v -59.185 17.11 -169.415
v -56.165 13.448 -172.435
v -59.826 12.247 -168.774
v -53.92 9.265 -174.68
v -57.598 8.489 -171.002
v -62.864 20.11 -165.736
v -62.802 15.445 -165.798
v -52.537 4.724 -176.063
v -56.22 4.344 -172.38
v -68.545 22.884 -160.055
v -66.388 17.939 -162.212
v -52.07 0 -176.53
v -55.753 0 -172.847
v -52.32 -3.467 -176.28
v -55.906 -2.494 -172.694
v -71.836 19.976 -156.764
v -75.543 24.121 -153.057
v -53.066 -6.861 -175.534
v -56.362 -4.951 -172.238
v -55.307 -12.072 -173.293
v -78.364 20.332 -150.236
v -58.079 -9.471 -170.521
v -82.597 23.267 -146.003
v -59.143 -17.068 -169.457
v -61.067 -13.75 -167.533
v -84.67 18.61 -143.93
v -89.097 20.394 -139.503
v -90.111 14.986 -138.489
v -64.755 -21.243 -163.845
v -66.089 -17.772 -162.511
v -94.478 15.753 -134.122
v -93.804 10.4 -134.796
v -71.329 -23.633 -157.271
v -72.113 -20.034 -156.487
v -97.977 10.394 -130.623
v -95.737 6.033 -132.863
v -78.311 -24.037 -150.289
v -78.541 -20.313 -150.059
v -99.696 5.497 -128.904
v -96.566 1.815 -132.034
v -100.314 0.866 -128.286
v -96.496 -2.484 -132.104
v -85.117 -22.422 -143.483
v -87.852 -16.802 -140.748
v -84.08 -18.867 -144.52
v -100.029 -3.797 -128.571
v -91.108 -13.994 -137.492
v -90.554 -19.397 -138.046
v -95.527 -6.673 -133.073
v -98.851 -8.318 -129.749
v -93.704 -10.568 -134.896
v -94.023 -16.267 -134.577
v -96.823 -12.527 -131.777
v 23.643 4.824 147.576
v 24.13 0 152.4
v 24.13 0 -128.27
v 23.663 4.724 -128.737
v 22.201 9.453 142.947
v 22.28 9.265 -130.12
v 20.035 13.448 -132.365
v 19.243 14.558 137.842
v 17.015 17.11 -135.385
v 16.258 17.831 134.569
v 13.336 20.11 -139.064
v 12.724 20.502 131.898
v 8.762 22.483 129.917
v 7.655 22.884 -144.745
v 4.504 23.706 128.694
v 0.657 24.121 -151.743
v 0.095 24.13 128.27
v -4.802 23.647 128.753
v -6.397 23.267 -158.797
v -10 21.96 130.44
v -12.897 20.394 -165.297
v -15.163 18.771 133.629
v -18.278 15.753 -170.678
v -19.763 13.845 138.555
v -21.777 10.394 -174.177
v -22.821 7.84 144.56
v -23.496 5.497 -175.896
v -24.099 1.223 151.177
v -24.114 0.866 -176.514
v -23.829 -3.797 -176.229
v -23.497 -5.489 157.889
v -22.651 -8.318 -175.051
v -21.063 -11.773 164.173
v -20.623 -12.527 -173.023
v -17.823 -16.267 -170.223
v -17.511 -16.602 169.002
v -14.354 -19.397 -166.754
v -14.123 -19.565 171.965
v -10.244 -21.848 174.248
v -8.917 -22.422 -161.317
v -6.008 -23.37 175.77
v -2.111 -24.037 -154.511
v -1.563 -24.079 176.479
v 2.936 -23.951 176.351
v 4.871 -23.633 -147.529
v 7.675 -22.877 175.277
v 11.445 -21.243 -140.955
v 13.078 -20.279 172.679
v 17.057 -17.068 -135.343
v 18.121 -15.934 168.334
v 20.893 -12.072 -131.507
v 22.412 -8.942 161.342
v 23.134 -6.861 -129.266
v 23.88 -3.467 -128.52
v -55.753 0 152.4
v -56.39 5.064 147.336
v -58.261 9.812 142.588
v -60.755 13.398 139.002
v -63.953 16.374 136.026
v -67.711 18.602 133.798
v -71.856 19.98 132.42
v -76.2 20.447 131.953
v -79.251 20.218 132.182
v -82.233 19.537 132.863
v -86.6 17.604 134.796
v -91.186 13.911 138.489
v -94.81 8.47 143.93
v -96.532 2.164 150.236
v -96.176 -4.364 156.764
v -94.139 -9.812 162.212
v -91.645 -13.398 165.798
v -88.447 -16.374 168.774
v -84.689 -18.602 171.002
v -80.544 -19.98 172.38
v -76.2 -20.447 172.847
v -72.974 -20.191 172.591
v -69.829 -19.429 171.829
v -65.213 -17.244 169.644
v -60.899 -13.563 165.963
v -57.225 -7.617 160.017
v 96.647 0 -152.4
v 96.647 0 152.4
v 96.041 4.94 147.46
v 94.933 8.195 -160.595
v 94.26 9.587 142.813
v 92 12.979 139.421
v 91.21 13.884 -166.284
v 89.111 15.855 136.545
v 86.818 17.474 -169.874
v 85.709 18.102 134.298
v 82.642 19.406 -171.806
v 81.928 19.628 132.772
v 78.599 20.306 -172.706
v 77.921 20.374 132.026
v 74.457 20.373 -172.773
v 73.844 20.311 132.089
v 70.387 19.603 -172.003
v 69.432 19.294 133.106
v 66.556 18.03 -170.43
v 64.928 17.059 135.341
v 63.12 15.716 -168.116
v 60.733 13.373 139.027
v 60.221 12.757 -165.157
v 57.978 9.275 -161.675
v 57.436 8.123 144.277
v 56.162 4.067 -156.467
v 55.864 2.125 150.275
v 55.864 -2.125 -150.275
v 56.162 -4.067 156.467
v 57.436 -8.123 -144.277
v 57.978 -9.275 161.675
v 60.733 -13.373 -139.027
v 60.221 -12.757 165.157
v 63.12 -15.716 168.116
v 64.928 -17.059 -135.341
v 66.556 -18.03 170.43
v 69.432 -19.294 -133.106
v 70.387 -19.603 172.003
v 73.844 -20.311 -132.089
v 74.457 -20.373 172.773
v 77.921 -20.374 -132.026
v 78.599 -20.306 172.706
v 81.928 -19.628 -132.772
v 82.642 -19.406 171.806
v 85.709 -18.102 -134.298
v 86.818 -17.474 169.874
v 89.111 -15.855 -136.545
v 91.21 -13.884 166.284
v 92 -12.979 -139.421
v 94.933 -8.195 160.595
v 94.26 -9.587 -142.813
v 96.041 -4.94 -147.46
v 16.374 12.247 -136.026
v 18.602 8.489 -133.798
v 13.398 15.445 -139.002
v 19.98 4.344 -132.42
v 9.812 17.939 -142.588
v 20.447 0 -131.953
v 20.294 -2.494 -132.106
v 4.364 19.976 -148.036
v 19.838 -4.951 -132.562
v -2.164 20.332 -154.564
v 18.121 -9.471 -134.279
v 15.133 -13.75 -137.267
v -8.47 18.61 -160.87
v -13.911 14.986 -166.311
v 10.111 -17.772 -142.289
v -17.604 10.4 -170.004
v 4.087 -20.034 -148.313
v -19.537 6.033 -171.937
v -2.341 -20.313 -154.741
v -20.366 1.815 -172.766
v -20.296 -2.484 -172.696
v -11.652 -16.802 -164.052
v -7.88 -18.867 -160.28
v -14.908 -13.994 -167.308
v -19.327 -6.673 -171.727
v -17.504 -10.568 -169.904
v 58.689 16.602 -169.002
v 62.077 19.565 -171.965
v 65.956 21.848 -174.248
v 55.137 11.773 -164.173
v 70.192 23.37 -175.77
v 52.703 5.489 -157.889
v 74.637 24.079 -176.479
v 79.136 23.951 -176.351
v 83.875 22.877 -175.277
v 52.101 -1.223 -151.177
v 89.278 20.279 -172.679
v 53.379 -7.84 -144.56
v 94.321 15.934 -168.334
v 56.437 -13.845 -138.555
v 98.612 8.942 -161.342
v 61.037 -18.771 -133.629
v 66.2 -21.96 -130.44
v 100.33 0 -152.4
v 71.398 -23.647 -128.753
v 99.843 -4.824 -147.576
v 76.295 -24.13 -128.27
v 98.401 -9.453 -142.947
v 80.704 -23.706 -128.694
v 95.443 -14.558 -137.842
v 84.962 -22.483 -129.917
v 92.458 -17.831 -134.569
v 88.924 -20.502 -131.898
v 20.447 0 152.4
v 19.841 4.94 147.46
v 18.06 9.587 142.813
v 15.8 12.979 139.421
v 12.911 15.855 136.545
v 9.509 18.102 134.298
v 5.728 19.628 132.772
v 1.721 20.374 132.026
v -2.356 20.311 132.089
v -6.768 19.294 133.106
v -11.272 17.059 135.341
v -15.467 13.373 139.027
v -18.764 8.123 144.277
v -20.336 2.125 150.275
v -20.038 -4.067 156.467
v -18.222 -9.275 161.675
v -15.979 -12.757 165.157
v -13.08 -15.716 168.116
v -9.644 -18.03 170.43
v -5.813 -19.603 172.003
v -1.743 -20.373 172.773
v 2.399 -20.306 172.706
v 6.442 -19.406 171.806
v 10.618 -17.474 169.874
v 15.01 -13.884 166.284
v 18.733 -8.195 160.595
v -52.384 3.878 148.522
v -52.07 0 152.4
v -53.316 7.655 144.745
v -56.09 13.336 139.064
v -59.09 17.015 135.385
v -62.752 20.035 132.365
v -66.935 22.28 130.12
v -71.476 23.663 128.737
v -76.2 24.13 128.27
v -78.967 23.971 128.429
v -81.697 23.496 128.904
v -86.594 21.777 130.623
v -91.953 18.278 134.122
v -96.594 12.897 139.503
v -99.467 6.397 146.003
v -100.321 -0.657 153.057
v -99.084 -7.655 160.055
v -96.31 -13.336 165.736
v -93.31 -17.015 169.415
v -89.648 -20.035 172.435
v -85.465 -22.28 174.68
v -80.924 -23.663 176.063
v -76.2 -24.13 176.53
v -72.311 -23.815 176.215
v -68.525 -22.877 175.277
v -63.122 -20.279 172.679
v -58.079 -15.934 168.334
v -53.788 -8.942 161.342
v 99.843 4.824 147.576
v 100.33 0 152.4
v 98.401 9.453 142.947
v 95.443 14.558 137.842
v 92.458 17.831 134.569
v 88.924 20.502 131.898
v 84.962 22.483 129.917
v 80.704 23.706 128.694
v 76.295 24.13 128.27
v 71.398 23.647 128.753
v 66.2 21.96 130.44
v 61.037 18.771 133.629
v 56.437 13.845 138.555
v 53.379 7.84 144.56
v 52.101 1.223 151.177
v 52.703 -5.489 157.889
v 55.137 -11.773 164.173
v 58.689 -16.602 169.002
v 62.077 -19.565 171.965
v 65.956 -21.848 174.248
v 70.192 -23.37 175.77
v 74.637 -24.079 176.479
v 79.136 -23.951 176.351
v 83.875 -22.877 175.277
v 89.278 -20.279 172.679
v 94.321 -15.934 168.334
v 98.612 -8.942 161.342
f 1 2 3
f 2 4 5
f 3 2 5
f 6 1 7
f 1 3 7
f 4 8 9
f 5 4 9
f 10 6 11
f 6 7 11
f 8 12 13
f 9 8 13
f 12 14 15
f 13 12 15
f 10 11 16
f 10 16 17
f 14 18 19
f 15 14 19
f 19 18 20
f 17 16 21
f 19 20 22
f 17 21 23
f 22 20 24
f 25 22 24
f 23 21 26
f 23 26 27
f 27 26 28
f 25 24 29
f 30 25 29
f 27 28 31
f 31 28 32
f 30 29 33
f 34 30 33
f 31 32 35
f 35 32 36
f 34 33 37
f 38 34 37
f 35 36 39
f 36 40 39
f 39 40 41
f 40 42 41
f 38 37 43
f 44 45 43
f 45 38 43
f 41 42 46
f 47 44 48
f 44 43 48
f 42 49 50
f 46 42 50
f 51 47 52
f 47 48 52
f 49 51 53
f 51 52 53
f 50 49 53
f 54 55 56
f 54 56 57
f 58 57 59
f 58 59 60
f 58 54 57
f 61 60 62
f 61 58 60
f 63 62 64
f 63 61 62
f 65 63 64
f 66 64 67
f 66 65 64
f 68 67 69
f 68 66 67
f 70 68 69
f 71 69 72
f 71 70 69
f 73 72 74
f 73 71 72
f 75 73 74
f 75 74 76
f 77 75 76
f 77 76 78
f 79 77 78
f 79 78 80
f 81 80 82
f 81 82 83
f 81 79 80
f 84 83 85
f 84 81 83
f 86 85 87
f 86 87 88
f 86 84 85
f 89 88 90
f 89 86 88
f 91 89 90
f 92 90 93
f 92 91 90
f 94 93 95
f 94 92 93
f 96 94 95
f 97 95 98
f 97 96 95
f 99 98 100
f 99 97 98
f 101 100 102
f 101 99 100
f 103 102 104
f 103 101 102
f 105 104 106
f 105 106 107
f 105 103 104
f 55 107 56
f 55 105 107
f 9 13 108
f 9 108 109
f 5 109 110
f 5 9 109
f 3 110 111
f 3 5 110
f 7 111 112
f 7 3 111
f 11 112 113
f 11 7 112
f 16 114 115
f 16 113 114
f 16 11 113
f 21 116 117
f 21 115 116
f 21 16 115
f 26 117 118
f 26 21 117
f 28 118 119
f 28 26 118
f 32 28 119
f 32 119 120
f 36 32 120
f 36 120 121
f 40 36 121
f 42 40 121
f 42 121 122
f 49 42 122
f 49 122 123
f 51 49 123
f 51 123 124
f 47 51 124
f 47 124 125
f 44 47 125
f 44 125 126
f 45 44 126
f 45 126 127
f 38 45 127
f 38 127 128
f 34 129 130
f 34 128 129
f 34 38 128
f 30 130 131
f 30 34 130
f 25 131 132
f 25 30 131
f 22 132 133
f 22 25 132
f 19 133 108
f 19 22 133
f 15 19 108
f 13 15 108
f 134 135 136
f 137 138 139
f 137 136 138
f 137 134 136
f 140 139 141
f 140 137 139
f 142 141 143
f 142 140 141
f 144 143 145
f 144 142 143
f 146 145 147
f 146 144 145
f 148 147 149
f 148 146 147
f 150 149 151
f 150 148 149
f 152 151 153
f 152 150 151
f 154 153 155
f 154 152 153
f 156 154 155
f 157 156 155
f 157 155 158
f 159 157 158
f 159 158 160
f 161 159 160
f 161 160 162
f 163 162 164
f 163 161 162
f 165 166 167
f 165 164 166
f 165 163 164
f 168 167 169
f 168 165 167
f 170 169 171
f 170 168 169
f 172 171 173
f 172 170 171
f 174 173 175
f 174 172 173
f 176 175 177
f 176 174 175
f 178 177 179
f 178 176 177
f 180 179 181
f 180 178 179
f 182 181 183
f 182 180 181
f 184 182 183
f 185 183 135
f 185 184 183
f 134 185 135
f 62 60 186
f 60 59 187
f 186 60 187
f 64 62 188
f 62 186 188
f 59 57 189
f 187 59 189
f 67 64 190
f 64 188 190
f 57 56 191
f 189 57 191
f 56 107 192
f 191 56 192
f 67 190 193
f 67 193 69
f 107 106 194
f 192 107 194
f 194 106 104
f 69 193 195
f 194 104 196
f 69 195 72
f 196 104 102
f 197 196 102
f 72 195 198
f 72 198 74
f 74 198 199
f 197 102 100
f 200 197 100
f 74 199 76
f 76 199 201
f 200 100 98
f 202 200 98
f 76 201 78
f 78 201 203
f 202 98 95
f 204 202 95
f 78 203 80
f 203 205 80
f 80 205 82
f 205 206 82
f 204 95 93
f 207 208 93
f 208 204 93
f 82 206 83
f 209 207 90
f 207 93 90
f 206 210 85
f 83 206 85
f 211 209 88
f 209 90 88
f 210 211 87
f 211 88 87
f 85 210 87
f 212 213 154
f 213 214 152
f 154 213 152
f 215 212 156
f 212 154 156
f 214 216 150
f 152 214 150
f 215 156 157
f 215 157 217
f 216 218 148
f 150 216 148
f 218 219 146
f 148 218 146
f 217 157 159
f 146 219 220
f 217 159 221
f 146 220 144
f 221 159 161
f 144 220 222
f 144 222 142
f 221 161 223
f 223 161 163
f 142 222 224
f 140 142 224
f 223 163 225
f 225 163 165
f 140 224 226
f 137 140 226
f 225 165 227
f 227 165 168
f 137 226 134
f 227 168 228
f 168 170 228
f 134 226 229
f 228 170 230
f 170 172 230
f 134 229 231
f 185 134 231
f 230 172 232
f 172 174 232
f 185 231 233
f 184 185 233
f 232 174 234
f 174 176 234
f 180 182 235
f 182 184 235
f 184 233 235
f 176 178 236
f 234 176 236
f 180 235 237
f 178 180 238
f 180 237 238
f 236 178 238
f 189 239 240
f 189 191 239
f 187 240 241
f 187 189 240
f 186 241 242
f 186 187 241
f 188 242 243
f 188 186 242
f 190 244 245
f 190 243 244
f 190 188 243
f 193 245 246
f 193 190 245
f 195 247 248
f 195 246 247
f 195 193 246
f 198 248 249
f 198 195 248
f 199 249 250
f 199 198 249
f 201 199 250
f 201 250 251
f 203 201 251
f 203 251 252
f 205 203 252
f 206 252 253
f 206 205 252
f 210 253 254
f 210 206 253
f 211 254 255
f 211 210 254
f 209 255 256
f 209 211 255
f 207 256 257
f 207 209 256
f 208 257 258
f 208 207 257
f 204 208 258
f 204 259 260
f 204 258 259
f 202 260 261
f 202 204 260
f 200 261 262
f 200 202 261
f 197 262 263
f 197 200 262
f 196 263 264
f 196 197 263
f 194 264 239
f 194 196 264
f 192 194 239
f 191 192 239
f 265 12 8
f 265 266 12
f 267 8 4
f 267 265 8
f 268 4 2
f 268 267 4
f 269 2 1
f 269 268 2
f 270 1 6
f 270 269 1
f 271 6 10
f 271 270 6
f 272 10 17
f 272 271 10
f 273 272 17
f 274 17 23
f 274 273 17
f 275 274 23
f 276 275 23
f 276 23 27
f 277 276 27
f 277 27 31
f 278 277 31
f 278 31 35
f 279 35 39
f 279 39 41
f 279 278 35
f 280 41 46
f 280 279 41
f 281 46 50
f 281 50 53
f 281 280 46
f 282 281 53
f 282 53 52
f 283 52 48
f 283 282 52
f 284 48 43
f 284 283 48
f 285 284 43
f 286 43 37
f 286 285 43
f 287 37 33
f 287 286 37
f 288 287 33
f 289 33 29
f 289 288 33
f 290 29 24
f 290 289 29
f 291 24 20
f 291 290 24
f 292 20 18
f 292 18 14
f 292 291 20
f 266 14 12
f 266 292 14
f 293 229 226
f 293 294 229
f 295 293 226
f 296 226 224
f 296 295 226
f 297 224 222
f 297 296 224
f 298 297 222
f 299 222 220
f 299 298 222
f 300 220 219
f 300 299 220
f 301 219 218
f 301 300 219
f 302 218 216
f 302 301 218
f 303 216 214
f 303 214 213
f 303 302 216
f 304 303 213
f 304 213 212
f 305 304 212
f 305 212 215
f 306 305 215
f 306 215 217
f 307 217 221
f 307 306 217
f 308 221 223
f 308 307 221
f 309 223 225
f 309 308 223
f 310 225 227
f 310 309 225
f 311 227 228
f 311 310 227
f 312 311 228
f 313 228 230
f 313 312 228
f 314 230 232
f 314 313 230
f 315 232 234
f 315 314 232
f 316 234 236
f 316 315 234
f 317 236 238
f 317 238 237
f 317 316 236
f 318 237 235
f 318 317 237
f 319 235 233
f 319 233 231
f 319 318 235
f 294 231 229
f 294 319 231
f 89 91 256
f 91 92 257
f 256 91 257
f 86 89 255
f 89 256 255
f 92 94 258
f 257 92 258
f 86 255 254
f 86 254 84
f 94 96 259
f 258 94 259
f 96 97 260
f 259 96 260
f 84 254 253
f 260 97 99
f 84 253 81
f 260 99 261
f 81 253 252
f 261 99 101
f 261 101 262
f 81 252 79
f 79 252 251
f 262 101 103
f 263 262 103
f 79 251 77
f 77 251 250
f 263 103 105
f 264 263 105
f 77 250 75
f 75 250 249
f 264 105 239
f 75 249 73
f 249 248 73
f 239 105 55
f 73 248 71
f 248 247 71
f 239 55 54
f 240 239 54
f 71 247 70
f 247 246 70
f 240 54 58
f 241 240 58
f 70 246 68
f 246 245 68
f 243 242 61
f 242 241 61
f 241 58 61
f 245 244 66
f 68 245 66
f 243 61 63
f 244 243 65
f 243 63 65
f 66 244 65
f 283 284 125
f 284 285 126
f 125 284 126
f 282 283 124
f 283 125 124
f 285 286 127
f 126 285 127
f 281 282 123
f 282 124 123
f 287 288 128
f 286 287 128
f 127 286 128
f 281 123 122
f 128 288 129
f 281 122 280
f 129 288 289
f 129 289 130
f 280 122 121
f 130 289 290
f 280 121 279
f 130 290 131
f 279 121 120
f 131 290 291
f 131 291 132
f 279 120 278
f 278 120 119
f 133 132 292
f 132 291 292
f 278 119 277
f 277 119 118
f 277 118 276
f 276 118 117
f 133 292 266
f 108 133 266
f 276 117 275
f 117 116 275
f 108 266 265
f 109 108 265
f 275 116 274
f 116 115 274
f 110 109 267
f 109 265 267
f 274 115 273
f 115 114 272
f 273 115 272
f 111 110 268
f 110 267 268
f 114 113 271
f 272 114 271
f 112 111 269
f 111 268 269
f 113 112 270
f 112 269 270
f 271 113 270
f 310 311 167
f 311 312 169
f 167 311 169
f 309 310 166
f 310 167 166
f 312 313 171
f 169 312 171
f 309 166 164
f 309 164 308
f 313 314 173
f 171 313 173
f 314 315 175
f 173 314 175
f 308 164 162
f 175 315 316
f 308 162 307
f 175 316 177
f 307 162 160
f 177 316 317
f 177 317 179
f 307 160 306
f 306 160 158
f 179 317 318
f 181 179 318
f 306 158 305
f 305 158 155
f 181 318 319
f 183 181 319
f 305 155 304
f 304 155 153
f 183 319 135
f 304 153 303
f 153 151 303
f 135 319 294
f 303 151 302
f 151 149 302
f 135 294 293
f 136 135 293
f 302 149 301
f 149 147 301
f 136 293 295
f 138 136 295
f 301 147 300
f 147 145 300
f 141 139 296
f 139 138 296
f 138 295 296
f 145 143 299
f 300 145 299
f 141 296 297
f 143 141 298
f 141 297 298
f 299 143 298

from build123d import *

# Parameters (mm, degrees)
F0_R      = 24.13
F0_R_2    = 20.447
F1_DEPTH  = 381
F2_R      = 24.13
F2_R_2    = 20.447
F3_DEPTH  = 228.6
F5_DEPTH  = 76.2
F7_DEPTH  = 76.2
F8_R      = 24.13
F8_R_2    = 20.447
F9_DEPTH  = 254
F11_DEPTH = 152.4
F13_DEPTH = 76.2
F16_DEPTH = 76.2


with BuildPart() as f1:
    # F0 (on Top) → F1 (new body, symmetric)
    with BuildSketch(Plane.XY):
        Circle(F0_R)
        Circle(F0_R_2, mode=Mode.SUBTRACT)
    extrude(amount=F1_DEPTH, both=True)


with BuildPart() as f3:
    # F2 (on Top) → F3 (new body, symmetric)
    with BuildSketch(Plane.XY):
        with Locations((-76.2, 0)):
            Circle(F2_R)
        with Locations((-76.2, 0)):
            Circle(F2_R_2, mode=Mode.SUBTRACT)
    extrude(amount=F3_DEPTH, both=True)


with BuildPart() as f5_tool:
    # F4 (on Front) → F5 (new body, symmetric)
    with BuildSketch(Plane.XZ):
        Polygon((76.2, -76.2), (0, -152.4), (-76.2, -228.6), (-403.8831914788, -406.4), (440.9483480078, -406.4), align=None)
    extrude(amount=F5_DEPTH, both=True)


with BuildPart() as f1_1:
    add(f1.part)

    # F5: cut by f5_tool
    add(f5_tool.part, mode=Mode.SUBTRACT)


with BuildPart() as f3_1:
    add(f3.part)

    # F5: cut by f5_tool
    add(f5_tool.part, mode=Mode.SUBTRACT)


with BuildPart() as f7_tool:
    # F6 (on Right) → F7 (new body, symmetric)
    with BuildSketch(Plane.YZ):
        Polygon((-76.2, 228.6), (0, 152.4), (76.2, 76.2), (76.2, 457.2), (-76.2, 457.2), align=None)
    extrude(amount=F7_DEPTH, both=True)


with BuildPart() as f1_2:
    add(f1_1.part)

    # F7: cut by f7_tool
    add(f7_tool.part, mode=Mode.SUBTRACT)


with BuildPart() as f3_2:
    add(f3_1.part)

    # F7: cut by f7_tool
    add(f7_tool.part, mode=Mode.SUBTRACT)


with BuildPart() as f9:
    # F8 (on Top) → F9 (new body, symmetric)
    with BuildSketch(Plane.XY):
        with Locations((76.2, 0)):
            Circle(F8_R)
        with Locations((76.2, 0)):
            Circle(F8_R_2, mode=Mode.SUBTRACT)
    extrude(amount=F9_DEPTH, both=True)


with BuildPart() as f11_tool:
    # F10 (on Right) → F11 (new body, symmetric)
    with BuildSketch(Plane.YZ):
        Polygon((-76.2, 228.6), (0, 152.4), (76.2, 76.2), (76.2, 304.8), (-76.2, 304.8), align=None)
    extrude(amount=F11_DEPTH, both=True)


with BuildPart() as f3_3:
    add(f3_2.part)

    # F11: cut by f11_tool
    add(f11_tool.part, mode=Mode.SUBTRACT)

    # F12 (on Front) → F13 (cut, symmetric)
    with BuildSketch(Plane.XZ):
        Polygon((0, -228.6), (-76.2, -152.4), (-152.4, -76.2), (-152.4, -304.8), (0, -304.8), align=None)
    extrude(amount=F13_DEPTH, both=True, mode=Mode.SUBTRACT)


with BuildPart() as f9_1:
    add(f9.part)

    # F11: cut by f11_tool
    add(f11_tool.part, mode=Mode.SUBTRACT)

    # F15 (on offset) → F16 (cut, symmetric)
    with BuildSketch(Plane.YZ.offset(76.2)):
        Polygon((76.2, -228.6), (0, -152.4), (-76.2, -76.2), (-76.2, -304.8), (76.2, -304.8), align=None)
    extrude(amount=F16_DEPTH, both=True, mode=Mode.SUBTRACT)


solid = Compound([f1_2.part, f3_3.part, f9_1.part])
